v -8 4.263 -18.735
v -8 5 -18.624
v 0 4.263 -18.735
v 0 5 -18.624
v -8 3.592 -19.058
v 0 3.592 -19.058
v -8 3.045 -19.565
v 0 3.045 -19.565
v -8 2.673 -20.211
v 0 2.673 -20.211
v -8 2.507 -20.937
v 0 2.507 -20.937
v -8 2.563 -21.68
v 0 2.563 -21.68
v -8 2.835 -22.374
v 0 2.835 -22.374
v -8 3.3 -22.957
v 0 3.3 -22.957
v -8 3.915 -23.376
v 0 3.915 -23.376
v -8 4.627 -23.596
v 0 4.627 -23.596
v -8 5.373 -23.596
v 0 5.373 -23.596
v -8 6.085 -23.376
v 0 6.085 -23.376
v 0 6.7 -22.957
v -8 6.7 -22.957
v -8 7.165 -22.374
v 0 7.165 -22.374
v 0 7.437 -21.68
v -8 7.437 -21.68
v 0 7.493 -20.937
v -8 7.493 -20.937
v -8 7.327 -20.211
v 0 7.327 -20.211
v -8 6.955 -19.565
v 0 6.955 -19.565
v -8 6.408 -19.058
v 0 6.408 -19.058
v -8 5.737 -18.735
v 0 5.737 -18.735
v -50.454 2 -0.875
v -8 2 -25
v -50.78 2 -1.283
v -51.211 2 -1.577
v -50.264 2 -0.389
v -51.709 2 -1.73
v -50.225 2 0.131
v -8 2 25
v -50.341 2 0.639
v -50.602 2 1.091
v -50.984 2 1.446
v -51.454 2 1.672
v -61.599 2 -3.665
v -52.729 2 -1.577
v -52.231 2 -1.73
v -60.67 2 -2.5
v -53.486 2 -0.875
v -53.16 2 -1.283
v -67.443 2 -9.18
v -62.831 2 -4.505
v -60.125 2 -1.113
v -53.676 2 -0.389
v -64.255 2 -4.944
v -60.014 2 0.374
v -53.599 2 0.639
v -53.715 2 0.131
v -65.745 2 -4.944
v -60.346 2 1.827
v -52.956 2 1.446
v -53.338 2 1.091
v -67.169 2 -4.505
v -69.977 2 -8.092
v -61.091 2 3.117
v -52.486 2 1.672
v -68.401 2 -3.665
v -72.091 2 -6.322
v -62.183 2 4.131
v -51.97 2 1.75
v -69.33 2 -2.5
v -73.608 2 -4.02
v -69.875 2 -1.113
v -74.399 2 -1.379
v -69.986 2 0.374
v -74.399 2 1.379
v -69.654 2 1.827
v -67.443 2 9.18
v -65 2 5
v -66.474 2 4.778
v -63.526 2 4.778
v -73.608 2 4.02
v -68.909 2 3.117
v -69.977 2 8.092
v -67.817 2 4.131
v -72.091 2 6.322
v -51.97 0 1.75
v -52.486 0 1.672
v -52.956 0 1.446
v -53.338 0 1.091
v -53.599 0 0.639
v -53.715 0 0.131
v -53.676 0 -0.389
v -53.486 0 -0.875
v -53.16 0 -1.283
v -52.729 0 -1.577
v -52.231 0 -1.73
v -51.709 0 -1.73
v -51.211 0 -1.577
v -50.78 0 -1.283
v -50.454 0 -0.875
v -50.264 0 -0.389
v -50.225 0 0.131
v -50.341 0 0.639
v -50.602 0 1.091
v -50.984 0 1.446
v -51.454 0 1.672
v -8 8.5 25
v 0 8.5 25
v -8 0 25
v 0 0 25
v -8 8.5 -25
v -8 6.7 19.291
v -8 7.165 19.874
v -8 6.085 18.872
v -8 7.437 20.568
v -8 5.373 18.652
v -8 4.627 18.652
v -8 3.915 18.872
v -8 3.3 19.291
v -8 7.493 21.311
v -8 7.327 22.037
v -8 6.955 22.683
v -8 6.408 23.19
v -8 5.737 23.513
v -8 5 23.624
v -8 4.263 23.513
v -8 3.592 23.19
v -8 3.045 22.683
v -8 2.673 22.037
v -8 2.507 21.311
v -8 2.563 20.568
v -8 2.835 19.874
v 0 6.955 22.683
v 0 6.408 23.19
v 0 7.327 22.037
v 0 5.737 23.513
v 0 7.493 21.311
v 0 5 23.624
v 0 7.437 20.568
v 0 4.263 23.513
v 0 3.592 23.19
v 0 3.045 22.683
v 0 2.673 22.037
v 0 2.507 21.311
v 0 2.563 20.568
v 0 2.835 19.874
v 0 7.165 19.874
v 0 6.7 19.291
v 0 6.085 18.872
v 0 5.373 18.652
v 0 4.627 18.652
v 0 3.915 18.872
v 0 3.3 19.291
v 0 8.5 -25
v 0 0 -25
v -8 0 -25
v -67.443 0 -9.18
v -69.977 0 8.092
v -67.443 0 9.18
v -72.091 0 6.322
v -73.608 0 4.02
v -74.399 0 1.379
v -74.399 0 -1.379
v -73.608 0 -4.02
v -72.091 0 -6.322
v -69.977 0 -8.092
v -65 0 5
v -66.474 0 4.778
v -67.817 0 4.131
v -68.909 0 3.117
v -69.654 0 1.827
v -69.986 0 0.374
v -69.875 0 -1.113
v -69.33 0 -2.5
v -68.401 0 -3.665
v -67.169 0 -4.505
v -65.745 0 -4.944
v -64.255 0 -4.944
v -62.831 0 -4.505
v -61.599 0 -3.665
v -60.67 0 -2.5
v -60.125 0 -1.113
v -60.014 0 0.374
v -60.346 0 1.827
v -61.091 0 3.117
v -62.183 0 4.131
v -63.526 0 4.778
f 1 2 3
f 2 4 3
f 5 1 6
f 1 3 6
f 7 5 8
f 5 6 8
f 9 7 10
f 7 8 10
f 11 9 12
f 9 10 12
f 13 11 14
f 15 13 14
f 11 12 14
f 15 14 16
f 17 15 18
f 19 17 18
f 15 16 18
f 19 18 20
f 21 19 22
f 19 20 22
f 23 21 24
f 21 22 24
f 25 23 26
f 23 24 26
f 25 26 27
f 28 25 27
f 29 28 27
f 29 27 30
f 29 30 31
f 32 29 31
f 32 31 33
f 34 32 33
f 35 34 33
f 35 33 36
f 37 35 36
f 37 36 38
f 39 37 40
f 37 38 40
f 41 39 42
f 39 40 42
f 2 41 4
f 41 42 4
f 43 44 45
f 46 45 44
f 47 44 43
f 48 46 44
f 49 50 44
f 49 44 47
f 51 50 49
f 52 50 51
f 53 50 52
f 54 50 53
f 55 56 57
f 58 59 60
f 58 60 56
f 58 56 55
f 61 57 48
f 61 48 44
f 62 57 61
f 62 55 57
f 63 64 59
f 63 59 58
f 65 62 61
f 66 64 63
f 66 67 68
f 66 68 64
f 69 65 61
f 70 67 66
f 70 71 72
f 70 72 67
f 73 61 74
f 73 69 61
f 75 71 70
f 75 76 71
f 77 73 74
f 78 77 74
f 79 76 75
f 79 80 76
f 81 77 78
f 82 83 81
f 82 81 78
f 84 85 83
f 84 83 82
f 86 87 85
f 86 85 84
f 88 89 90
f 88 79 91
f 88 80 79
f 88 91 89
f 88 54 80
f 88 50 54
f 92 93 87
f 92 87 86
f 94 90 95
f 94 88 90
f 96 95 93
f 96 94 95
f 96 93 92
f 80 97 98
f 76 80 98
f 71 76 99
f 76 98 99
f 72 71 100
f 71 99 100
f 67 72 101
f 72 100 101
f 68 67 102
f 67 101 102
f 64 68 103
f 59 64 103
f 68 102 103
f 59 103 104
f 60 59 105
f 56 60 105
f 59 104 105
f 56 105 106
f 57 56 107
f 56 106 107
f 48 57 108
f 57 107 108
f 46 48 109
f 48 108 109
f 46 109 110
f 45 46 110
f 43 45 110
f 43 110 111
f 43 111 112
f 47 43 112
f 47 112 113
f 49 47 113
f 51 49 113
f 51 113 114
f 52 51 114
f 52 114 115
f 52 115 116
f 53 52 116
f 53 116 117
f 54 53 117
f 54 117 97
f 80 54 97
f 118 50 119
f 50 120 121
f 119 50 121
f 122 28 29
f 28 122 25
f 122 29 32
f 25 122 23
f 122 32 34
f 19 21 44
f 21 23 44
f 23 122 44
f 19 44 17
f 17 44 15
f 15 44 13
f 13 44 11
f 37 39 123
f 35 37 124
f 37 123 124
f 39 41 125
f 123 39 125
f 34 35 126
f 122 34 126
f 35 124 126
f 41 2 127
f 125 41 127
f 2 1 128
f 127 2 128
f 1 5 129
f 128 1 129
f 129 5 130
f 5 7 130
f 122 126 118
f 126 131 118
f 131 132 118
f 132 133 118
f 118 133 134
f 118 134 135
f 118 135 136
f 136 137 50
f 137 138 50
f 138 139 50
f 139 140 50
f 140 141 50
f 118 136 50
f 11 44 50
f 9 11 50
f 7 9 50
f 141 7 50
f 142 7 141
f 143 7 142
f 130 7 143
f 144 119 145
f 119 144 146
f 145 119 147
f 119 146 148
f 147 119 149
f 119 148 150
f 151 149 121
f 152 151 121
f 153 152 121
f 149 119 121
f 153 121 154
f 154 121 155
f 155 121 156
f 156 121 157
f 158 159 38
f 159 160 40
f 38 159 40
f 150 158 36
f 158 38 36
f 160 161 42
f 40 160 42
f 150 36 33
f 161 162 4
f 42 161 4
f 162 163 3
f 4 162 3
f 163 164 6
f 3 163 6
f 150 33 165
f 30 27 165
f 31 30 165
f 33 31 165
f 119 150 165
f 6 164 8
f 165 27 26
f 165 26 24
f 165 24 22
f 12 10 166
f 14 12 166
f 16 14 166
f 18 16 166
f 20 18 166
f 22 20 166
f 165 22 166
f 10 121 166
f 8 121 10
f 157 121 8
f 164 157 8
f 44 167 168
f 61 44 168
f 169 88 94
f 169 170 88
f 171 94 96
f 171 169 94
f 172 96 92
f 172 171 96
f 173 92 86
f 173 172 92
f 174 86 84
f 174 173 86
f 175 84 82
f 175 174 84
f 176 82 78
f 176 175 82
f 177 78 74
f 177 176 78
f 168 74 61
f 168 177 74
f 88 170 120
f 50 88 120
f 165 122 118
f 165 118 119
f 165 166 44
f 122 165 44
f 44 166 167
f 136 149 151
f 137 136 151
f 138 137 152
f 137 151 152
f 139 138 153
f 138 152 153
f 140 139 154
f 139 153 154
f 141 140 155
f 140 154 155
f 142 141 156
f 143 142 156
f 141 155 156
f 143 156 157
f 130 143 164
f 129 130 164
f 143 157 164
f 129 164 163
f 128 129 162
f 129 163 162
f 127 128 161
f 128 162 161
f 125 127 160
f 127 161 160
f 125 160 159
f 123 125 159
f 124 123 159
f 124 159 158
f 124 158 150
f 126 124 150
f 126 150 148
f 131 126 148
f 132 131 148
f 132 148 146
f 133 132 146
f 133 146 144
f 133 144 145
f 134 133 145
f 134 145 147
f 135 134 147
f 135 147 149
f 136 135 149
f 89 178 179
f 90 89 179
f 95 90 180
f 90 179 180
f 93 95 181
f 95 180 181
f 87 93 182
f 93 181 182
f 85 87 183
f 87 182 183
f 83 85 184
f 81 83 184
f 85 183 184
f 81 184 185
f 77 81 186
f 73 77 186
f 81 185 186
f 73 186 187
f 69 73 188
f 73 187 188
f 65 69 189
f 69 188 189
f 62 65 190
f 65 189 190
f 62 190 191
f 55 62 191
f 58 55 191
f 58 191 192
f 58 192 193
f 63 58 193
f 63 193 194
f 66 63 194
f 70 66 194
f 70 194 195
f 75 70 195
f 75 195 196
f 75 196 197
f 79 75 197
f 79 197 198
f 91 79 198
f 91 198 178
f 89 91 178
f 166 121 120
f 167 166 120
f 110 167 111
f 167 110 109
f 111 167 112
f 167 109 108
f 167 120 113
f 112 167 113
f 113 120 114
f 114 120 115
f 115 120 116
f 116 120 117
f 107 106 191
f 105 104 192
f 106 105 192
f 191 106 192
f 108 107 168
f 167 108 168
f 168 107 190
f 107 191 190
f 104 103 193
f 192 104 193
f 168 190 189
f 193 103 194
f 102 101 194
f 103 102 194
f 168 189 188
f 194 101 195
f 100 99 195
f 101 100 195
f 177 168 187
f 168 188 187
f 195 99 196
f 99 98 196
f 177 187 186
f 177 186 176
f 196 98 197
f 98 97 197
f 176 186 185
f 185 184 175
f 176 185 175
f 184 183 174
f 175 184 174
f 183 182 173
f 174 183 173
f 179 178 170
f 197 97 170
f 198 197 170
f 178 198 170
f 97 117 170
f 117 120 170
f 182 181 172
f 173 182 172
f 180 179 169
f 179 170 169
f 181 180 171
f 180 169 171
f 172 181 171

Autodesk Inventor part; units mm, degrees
ref_plane "YZ Plane" through (0, 0, 0) normal (1, 0, 0) x (0, 1, 0)
ref_plane "XZ Plane" through (0, 0, 0) normal (0, 1, 0) x (-1, 0, 0)
ref_plane "XY Plane" through (0, 0, 0) normal (0, 0, 1) x (1, 0, 0)
sketch "Skizze1" plane through (0, 0, 0) normal (0, 1, 0) x (-1, 0, 0)
  line L0 (0, 25) -> (0, -25)
  line L1 (0, -25) -> (8, -25)
  line L2 (8, -25) -> (67.4432, -9.1805)
  arc A0 (67.4432, -9.1805) -> (67.4432, 9.1805) centre (65, 0) ccw
  line L3 (67.4432, 9.1805) -> (8, 25)
  line L4 (8, 25) -> (0, 25)
  line L5 (0, 0) -> (65, 0) construction
  dimension "d0" = 9.5
  dimension "d1" = 50
  dimension "d2" = 8
  dimension "d3" = 65
extrude "Extrusion1" add sketch "Skizze1" along normal blind 2
sketch "Skizze2" plane through (0, 2, 0) normal (0, 1, 0) x (1, 0, 0)
  line L0 (-67.4432, -9.1805) -> (-8, -25) projected
  line L1 (0, 25) -> (-8, 25) projected
  line L2 (-8, -25) -> (0, -25)
  line L3 (0, -25) -> (0, 25)
  line L4 (0, 25) -> (-8, 25)
  line L5 (-8, 25) -> (-8, -25)
  point P0 (0, 0)
  point P1 (-8, 25)
extrude "Extrusion2" add sketch "Skizze2" along normal blind 6.5
sketch "Skizze3" plane through (-8, 2, -25) normal (-1, 0, 0) x (0, 0, 1)
  line L0 (50, -2) -> (0, -2) projected
  line L1 (0, 6.5) -> (50, 6.5) projected
  line L2 (25, 6.5) -> (25, -12.2708) construction
  point P0 (25, -2)
  point P1 (46.124, 3)
  point P2 (3.876, 3)
  dimension "d15" = 5
  dimension "d33" = 42.248
hole "Bohrung1" at (-8, 5, 21.124) at (-8, 5, -21.124) direction (1, 0, 0) diameter 5 depth 8
sketch "Skizze4" plane through (0, 2, 0) normal (0, 1, 0) x (1, 0, 0)
  arc A0 (-67.4432, 9.1805) -> (-67.4432, -9.1805) centre (-65, 0) ccw projected
  point P0 (0, 0)
hole "Bohrung2" at (-65, 2, 0) direction (0, -1, 0) diameter 10 depth 2
sketch "Skizze5" plane through (0, 2, 0) normal (0, 1, 0) x (1, 0, 0)
  arc A0 (-67.4432, 9.1805) -> (-67.4432, -9.1805) centre (-65, 0) ccw projected
  point P0 (0, 0)
  point P1 (-51.97, 0)
  point P2 (-74.5, 0)
  dimension "d32" = 13.03
hole "Bohrung3" at (-51.97, 2, 0) direction (0, -1, 0) diameter 3.5 depth 2
properties part number "05" material "Aluminium 6061"
